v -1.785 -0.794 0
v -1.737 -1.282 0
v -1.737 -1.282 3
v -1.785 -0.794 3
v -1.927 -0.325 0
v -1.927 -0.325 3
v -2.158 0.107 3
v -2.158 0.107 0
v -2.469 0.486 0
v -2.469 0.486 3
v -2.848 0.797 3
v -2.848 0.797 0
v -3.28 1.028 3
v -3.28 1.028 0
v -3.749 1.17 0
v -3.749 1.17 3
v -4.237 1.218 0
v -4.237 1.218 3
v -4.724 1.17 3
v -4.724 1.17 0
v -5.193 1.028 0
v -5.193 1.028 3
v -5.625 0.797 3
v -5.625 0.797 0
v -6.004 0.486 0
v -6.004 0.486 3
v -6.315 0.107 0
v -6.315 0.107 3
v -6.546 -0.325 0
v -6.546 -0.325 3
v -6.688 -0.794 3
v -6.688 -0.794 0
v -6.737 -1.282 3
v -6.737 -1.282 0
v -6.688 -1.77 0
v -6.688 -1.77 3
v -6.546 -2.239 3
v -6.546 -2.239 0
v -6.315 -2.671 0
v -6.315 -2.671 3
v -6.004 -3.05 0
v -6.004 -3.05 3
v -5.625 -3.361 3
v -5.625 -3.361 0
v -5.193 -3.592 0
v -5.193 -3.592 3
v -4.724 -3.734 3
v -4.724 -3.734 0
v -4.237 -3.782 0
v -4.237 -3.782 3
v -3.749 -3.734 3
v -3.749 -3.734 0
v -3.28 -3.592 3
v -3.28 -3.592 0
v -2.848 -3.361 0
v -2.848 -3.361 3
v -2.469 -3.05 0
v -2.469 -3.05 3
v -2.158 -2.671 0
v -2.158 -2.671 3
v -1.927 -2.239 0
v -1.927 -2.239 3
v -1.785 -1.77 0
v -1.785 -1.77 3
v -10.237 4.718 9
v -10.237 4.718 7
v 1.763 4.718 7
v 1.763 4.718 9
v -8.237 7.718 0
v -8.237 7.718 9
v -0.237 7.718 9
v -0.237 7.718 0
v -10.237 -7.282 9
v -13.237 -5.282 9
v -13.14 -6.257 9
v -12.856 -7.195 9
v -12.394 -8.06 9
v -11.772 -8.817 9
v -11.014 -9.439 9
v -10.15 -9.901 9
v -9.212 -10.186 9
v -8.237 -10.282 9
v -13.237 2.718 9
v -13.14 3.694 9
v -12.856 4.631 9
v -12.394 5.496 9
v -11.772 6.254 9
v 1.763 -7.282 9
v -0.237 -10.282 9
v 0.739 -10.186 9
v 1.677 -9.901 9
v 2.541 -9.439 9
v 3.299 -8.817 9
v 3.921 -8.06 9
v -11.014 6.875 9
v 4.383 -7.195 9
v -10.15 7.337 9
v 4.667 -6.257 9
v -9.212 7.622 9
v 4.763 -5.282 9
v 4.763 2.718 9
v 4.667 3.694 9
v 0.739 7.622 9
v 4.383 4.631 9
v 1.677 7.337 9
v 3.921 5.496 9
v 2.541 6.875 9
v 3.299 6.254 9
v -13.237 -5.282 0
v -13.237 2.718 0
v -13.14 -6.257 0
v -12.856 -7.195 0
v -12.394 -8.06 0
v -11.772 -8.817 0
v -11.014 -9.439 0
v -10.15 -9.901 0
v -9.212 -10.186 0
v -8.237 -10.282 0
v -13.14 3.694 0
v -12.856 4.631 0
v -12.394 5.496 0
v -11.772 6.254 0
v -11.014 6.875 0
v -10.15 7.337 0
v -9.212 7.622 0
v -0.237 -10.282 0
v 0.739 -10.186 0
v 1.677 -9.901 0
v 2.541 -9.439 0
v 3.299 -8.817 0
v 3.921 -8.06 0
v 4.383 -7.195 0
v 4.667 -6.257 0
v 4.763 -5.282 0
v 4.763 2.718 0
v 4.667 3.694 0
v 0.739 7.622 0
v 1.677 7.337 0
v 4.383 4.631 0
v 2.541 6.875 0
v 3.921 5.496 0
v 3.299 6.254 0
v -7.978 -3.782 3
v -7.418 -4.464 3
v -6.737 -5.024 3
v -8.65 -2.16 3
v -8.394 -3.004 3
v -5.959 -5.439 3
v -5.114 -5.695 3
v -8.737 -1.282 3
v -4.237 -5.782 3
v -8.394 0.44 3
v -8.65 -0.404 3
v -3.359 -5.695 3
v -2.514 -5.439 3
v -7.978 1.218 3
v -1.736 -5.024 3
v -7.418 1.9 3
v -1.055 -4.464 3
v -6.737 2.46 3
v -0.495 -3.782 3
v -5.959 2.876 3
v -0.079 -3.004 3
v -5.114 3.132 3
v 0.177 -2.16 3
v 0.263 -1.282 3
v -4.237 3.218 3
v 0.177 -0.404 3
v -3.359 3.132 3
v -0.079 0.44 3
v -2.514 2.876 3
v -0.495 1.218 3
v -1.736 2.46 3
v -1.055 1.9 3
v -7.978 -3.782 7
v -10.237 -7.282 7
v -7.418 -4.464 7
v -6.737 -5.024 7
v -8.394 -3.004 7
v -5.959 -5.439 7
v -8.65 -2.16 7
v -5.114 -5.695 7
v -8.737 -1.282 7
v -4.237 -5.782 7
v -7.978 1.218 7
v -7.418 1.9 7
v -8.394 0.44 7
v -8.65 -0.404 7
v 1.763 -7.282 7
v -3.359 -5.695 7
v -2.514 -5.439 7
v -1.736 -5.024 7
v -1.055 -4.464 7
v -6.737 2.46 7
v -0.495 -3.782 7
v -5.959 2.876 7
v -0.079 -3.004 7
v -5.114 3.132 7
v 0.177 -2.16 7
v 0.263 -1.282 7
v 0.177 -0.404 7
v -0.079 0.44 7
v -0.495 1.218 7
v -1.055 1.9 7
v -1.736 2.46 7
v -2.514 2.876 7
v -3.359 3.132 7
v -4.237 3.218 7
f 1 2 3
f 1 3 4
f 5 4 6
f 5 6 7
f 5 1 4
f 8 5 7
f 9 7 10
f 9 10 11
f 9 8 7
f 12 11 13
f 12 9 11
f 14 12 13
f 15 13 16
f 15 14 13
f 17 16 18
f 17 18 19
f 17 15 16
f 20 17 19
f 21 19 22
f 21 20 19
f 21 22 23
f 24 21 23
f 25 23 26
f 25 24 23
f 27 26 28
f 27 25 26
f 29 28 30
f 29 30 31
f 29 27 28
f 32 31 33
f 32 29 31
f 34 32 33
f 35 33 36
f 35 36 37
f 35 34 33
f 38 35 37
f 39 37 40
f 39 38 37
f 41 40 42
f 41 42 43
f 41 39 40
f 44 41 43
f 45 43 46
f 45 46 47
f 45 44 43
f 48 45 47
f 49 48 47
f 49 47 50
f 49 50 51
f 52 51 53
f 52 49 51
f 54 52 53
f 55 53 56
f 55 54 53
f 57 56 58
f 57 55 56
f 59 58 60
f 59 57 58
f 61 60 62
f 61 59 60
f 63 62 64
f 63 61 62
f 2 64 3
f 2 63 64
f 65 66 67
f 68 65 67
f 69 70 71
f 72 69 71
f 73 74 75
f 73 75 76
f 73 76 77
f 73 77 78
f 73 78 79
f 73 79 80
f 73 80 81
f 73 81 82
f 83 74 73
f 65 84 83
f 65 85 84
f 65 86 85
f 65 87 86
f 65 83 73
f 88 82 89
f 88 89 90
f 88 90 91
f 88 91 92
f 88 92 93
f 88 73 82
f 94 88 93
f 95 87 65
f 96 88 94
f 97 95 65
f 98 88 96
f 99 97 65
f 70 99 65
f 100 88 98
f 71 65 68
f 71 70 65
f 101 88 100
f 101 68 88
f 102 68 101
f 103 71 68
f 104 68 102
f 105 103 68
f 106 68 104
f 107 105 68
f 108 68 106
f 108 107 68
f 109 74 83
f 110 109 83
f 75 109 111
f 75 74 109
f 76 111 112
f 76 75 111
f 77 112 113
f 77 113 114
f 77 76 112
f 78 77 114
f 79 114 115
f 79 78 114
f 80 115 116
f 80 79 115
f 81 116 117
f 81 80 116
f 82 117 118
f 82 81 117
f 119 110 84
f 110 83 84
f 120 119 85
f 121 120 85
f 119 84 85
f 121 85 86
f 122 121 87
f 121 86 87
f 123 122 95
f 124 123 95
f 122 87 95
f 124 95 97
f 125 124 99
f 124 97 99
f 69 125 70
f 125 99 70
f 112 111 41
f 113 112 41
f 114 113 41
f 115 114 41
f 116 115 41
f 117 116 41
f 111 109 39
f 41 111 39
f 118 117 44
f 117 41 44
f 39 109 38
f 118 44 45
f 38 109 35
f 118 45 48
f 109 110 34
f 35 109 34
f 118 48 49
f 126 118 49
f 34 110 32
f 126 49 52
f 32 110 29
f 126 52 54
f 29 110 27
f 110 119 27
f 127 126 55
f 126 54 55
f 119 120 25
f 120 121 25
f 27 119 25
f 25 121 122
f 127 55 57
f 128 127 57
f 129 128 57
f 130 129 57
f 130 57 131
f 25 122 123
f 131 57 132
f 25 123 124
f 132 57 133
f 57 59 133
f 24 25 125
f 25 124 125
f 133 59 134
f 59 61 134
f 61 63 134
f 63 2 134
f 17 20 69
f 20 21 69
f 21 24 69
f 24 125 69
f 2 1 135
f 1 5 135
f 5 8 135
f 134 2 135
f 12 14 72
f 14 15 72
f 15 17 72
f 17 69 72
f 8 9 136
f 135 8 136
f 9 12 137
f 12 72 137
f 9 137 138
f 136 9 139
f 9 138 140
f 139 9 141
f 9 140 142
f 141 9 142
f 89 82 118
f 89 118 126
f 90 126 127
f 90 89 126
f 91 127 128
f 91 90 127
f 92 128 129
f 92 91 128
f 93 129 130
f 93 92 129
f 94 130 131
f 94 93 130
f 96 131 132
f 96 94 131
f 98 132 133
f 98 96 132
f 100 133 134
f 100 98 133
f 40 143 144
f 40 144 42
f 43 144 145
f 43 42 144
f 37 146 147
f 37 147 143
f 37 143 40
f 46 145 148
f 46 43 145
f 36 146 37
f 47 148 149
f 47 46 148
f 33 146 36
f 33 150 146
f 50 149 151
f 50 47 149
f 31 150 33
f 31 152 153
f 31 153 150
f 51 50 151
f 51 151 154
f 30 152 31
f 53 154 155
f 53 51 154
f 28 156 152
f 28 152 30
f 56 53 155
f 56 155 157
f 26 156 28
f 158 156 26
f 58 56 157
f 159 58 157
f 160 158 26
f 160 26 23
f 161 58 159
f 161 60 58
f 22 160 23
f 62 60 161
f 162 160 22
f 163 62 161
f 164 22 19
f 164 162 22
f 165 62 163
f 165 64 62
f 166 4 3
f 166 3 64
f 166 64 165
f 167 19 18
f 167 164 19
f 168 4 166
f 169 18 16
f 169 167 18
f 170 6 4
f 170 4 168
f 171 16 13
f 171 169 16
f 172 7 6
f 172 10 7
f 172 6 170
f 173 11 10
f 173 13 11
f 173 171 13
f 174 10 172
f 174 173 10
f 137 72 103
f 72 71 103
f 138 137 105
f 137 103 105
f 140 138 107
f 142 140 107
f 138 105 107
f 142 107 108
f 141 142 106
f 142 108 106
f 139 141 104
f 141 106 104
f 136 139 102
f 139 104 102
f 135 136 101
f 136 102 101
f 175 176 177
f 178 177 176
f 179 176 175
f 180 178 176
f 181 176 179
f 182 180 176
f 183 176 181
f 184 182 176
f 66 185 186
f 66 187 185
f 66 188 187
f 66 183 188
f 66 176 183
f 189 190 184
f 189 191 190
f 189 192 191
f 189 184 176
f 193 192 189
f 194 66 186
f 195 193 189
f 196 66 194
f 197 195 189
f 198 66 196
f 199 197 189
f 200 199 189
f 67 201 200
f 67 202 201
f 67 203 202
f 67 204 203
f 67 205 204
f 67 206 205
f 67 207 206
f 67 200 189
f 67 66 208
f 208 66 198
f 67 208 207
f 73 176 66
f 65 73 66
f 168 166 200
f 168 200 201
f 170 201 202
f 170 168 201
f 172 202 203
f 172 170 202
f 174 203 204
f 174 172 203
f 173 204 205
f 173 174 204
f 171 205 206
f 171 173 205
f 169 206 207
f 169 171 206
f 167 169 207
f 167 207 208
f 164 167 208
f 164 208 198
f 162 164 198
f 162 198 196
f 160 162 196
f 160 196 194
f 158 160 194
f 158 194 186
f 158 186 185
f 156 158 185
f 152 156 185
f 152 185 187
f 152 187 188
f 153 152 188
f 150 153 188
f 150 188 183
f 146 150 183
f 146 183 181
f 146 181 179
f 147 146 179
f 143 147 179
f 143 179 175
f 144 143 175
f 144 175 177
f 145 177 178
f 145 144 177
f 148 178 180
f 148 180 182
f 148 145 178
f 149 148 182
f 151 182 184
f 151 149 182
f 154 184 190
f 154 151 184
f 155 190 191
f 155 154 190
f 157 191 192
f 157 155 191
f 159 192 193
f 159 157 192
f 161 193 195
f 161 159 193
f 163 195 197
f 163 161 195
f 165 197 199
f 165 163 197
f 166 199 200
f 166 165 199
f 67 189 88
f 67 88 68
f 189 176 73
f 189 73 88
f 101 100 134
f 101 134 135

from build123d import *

# Parameters (mm, degrees)
F0_W     = 12
F0_H     = 12
F0_R     = 4.5
F1_DEPTH = 7
F0_W_2   = 18
F0_H_2   = 18
F2_DEPTH = 9
F3_R     = 5
F0_R_2   = 2.5
F4_DEPTH = 3


with BuildPart() as f1:
    # F0 (on Top) → F1 (new body)
    with BuildSketch(Plane.XY):
        with Locations((-4.236515, -1.281935)):
            Rectangle(F0_W, F0_H)
        with Locations((-4.236515, -1.281935)):
            Circle(F0_R, mode=Mode.SUBTRACT)
    extrude(amount=F1_DEPTH)

    # F0 (on Top) → F2 (join)
    with BuildSketch(Plane.XY):
        with Locations((-4.236515, -1.281935)):
            Rectangle(F0_W_2, F0_H_2)
        with Locations((-4.236515, -1.281935)):
            Rectangle(F0_W, F0_H, mode=Mode.SUBTRACT)
    extrude(amount=F2_DEPTH)

    # F3
    f3_edges = [f1.edges().sort_by_distance(p)[0] for p in [
        (-13.236515, -10.281935, 4.5),
        (4.763485, -10.281935, 4.5),
        (4.763485, 7.718065, 4.5),
        (-13.236515, 7.718065, 4.5),
    ]]
    fillet(f3_edges, radius=F3_R)

    # F0 (on Top) → F4 (join)
    with BuildSketch(Plane.XY):
        with Locations((-4.236515, -1.281935)):
            Circle(F0_R)
        with Locations((-4.236515, -1.281935)):
            Circle(F0_R_2, mode=Mode.SUBTRACT)
    extrude(amount=F4_DEPTH)


solid = f1.part
